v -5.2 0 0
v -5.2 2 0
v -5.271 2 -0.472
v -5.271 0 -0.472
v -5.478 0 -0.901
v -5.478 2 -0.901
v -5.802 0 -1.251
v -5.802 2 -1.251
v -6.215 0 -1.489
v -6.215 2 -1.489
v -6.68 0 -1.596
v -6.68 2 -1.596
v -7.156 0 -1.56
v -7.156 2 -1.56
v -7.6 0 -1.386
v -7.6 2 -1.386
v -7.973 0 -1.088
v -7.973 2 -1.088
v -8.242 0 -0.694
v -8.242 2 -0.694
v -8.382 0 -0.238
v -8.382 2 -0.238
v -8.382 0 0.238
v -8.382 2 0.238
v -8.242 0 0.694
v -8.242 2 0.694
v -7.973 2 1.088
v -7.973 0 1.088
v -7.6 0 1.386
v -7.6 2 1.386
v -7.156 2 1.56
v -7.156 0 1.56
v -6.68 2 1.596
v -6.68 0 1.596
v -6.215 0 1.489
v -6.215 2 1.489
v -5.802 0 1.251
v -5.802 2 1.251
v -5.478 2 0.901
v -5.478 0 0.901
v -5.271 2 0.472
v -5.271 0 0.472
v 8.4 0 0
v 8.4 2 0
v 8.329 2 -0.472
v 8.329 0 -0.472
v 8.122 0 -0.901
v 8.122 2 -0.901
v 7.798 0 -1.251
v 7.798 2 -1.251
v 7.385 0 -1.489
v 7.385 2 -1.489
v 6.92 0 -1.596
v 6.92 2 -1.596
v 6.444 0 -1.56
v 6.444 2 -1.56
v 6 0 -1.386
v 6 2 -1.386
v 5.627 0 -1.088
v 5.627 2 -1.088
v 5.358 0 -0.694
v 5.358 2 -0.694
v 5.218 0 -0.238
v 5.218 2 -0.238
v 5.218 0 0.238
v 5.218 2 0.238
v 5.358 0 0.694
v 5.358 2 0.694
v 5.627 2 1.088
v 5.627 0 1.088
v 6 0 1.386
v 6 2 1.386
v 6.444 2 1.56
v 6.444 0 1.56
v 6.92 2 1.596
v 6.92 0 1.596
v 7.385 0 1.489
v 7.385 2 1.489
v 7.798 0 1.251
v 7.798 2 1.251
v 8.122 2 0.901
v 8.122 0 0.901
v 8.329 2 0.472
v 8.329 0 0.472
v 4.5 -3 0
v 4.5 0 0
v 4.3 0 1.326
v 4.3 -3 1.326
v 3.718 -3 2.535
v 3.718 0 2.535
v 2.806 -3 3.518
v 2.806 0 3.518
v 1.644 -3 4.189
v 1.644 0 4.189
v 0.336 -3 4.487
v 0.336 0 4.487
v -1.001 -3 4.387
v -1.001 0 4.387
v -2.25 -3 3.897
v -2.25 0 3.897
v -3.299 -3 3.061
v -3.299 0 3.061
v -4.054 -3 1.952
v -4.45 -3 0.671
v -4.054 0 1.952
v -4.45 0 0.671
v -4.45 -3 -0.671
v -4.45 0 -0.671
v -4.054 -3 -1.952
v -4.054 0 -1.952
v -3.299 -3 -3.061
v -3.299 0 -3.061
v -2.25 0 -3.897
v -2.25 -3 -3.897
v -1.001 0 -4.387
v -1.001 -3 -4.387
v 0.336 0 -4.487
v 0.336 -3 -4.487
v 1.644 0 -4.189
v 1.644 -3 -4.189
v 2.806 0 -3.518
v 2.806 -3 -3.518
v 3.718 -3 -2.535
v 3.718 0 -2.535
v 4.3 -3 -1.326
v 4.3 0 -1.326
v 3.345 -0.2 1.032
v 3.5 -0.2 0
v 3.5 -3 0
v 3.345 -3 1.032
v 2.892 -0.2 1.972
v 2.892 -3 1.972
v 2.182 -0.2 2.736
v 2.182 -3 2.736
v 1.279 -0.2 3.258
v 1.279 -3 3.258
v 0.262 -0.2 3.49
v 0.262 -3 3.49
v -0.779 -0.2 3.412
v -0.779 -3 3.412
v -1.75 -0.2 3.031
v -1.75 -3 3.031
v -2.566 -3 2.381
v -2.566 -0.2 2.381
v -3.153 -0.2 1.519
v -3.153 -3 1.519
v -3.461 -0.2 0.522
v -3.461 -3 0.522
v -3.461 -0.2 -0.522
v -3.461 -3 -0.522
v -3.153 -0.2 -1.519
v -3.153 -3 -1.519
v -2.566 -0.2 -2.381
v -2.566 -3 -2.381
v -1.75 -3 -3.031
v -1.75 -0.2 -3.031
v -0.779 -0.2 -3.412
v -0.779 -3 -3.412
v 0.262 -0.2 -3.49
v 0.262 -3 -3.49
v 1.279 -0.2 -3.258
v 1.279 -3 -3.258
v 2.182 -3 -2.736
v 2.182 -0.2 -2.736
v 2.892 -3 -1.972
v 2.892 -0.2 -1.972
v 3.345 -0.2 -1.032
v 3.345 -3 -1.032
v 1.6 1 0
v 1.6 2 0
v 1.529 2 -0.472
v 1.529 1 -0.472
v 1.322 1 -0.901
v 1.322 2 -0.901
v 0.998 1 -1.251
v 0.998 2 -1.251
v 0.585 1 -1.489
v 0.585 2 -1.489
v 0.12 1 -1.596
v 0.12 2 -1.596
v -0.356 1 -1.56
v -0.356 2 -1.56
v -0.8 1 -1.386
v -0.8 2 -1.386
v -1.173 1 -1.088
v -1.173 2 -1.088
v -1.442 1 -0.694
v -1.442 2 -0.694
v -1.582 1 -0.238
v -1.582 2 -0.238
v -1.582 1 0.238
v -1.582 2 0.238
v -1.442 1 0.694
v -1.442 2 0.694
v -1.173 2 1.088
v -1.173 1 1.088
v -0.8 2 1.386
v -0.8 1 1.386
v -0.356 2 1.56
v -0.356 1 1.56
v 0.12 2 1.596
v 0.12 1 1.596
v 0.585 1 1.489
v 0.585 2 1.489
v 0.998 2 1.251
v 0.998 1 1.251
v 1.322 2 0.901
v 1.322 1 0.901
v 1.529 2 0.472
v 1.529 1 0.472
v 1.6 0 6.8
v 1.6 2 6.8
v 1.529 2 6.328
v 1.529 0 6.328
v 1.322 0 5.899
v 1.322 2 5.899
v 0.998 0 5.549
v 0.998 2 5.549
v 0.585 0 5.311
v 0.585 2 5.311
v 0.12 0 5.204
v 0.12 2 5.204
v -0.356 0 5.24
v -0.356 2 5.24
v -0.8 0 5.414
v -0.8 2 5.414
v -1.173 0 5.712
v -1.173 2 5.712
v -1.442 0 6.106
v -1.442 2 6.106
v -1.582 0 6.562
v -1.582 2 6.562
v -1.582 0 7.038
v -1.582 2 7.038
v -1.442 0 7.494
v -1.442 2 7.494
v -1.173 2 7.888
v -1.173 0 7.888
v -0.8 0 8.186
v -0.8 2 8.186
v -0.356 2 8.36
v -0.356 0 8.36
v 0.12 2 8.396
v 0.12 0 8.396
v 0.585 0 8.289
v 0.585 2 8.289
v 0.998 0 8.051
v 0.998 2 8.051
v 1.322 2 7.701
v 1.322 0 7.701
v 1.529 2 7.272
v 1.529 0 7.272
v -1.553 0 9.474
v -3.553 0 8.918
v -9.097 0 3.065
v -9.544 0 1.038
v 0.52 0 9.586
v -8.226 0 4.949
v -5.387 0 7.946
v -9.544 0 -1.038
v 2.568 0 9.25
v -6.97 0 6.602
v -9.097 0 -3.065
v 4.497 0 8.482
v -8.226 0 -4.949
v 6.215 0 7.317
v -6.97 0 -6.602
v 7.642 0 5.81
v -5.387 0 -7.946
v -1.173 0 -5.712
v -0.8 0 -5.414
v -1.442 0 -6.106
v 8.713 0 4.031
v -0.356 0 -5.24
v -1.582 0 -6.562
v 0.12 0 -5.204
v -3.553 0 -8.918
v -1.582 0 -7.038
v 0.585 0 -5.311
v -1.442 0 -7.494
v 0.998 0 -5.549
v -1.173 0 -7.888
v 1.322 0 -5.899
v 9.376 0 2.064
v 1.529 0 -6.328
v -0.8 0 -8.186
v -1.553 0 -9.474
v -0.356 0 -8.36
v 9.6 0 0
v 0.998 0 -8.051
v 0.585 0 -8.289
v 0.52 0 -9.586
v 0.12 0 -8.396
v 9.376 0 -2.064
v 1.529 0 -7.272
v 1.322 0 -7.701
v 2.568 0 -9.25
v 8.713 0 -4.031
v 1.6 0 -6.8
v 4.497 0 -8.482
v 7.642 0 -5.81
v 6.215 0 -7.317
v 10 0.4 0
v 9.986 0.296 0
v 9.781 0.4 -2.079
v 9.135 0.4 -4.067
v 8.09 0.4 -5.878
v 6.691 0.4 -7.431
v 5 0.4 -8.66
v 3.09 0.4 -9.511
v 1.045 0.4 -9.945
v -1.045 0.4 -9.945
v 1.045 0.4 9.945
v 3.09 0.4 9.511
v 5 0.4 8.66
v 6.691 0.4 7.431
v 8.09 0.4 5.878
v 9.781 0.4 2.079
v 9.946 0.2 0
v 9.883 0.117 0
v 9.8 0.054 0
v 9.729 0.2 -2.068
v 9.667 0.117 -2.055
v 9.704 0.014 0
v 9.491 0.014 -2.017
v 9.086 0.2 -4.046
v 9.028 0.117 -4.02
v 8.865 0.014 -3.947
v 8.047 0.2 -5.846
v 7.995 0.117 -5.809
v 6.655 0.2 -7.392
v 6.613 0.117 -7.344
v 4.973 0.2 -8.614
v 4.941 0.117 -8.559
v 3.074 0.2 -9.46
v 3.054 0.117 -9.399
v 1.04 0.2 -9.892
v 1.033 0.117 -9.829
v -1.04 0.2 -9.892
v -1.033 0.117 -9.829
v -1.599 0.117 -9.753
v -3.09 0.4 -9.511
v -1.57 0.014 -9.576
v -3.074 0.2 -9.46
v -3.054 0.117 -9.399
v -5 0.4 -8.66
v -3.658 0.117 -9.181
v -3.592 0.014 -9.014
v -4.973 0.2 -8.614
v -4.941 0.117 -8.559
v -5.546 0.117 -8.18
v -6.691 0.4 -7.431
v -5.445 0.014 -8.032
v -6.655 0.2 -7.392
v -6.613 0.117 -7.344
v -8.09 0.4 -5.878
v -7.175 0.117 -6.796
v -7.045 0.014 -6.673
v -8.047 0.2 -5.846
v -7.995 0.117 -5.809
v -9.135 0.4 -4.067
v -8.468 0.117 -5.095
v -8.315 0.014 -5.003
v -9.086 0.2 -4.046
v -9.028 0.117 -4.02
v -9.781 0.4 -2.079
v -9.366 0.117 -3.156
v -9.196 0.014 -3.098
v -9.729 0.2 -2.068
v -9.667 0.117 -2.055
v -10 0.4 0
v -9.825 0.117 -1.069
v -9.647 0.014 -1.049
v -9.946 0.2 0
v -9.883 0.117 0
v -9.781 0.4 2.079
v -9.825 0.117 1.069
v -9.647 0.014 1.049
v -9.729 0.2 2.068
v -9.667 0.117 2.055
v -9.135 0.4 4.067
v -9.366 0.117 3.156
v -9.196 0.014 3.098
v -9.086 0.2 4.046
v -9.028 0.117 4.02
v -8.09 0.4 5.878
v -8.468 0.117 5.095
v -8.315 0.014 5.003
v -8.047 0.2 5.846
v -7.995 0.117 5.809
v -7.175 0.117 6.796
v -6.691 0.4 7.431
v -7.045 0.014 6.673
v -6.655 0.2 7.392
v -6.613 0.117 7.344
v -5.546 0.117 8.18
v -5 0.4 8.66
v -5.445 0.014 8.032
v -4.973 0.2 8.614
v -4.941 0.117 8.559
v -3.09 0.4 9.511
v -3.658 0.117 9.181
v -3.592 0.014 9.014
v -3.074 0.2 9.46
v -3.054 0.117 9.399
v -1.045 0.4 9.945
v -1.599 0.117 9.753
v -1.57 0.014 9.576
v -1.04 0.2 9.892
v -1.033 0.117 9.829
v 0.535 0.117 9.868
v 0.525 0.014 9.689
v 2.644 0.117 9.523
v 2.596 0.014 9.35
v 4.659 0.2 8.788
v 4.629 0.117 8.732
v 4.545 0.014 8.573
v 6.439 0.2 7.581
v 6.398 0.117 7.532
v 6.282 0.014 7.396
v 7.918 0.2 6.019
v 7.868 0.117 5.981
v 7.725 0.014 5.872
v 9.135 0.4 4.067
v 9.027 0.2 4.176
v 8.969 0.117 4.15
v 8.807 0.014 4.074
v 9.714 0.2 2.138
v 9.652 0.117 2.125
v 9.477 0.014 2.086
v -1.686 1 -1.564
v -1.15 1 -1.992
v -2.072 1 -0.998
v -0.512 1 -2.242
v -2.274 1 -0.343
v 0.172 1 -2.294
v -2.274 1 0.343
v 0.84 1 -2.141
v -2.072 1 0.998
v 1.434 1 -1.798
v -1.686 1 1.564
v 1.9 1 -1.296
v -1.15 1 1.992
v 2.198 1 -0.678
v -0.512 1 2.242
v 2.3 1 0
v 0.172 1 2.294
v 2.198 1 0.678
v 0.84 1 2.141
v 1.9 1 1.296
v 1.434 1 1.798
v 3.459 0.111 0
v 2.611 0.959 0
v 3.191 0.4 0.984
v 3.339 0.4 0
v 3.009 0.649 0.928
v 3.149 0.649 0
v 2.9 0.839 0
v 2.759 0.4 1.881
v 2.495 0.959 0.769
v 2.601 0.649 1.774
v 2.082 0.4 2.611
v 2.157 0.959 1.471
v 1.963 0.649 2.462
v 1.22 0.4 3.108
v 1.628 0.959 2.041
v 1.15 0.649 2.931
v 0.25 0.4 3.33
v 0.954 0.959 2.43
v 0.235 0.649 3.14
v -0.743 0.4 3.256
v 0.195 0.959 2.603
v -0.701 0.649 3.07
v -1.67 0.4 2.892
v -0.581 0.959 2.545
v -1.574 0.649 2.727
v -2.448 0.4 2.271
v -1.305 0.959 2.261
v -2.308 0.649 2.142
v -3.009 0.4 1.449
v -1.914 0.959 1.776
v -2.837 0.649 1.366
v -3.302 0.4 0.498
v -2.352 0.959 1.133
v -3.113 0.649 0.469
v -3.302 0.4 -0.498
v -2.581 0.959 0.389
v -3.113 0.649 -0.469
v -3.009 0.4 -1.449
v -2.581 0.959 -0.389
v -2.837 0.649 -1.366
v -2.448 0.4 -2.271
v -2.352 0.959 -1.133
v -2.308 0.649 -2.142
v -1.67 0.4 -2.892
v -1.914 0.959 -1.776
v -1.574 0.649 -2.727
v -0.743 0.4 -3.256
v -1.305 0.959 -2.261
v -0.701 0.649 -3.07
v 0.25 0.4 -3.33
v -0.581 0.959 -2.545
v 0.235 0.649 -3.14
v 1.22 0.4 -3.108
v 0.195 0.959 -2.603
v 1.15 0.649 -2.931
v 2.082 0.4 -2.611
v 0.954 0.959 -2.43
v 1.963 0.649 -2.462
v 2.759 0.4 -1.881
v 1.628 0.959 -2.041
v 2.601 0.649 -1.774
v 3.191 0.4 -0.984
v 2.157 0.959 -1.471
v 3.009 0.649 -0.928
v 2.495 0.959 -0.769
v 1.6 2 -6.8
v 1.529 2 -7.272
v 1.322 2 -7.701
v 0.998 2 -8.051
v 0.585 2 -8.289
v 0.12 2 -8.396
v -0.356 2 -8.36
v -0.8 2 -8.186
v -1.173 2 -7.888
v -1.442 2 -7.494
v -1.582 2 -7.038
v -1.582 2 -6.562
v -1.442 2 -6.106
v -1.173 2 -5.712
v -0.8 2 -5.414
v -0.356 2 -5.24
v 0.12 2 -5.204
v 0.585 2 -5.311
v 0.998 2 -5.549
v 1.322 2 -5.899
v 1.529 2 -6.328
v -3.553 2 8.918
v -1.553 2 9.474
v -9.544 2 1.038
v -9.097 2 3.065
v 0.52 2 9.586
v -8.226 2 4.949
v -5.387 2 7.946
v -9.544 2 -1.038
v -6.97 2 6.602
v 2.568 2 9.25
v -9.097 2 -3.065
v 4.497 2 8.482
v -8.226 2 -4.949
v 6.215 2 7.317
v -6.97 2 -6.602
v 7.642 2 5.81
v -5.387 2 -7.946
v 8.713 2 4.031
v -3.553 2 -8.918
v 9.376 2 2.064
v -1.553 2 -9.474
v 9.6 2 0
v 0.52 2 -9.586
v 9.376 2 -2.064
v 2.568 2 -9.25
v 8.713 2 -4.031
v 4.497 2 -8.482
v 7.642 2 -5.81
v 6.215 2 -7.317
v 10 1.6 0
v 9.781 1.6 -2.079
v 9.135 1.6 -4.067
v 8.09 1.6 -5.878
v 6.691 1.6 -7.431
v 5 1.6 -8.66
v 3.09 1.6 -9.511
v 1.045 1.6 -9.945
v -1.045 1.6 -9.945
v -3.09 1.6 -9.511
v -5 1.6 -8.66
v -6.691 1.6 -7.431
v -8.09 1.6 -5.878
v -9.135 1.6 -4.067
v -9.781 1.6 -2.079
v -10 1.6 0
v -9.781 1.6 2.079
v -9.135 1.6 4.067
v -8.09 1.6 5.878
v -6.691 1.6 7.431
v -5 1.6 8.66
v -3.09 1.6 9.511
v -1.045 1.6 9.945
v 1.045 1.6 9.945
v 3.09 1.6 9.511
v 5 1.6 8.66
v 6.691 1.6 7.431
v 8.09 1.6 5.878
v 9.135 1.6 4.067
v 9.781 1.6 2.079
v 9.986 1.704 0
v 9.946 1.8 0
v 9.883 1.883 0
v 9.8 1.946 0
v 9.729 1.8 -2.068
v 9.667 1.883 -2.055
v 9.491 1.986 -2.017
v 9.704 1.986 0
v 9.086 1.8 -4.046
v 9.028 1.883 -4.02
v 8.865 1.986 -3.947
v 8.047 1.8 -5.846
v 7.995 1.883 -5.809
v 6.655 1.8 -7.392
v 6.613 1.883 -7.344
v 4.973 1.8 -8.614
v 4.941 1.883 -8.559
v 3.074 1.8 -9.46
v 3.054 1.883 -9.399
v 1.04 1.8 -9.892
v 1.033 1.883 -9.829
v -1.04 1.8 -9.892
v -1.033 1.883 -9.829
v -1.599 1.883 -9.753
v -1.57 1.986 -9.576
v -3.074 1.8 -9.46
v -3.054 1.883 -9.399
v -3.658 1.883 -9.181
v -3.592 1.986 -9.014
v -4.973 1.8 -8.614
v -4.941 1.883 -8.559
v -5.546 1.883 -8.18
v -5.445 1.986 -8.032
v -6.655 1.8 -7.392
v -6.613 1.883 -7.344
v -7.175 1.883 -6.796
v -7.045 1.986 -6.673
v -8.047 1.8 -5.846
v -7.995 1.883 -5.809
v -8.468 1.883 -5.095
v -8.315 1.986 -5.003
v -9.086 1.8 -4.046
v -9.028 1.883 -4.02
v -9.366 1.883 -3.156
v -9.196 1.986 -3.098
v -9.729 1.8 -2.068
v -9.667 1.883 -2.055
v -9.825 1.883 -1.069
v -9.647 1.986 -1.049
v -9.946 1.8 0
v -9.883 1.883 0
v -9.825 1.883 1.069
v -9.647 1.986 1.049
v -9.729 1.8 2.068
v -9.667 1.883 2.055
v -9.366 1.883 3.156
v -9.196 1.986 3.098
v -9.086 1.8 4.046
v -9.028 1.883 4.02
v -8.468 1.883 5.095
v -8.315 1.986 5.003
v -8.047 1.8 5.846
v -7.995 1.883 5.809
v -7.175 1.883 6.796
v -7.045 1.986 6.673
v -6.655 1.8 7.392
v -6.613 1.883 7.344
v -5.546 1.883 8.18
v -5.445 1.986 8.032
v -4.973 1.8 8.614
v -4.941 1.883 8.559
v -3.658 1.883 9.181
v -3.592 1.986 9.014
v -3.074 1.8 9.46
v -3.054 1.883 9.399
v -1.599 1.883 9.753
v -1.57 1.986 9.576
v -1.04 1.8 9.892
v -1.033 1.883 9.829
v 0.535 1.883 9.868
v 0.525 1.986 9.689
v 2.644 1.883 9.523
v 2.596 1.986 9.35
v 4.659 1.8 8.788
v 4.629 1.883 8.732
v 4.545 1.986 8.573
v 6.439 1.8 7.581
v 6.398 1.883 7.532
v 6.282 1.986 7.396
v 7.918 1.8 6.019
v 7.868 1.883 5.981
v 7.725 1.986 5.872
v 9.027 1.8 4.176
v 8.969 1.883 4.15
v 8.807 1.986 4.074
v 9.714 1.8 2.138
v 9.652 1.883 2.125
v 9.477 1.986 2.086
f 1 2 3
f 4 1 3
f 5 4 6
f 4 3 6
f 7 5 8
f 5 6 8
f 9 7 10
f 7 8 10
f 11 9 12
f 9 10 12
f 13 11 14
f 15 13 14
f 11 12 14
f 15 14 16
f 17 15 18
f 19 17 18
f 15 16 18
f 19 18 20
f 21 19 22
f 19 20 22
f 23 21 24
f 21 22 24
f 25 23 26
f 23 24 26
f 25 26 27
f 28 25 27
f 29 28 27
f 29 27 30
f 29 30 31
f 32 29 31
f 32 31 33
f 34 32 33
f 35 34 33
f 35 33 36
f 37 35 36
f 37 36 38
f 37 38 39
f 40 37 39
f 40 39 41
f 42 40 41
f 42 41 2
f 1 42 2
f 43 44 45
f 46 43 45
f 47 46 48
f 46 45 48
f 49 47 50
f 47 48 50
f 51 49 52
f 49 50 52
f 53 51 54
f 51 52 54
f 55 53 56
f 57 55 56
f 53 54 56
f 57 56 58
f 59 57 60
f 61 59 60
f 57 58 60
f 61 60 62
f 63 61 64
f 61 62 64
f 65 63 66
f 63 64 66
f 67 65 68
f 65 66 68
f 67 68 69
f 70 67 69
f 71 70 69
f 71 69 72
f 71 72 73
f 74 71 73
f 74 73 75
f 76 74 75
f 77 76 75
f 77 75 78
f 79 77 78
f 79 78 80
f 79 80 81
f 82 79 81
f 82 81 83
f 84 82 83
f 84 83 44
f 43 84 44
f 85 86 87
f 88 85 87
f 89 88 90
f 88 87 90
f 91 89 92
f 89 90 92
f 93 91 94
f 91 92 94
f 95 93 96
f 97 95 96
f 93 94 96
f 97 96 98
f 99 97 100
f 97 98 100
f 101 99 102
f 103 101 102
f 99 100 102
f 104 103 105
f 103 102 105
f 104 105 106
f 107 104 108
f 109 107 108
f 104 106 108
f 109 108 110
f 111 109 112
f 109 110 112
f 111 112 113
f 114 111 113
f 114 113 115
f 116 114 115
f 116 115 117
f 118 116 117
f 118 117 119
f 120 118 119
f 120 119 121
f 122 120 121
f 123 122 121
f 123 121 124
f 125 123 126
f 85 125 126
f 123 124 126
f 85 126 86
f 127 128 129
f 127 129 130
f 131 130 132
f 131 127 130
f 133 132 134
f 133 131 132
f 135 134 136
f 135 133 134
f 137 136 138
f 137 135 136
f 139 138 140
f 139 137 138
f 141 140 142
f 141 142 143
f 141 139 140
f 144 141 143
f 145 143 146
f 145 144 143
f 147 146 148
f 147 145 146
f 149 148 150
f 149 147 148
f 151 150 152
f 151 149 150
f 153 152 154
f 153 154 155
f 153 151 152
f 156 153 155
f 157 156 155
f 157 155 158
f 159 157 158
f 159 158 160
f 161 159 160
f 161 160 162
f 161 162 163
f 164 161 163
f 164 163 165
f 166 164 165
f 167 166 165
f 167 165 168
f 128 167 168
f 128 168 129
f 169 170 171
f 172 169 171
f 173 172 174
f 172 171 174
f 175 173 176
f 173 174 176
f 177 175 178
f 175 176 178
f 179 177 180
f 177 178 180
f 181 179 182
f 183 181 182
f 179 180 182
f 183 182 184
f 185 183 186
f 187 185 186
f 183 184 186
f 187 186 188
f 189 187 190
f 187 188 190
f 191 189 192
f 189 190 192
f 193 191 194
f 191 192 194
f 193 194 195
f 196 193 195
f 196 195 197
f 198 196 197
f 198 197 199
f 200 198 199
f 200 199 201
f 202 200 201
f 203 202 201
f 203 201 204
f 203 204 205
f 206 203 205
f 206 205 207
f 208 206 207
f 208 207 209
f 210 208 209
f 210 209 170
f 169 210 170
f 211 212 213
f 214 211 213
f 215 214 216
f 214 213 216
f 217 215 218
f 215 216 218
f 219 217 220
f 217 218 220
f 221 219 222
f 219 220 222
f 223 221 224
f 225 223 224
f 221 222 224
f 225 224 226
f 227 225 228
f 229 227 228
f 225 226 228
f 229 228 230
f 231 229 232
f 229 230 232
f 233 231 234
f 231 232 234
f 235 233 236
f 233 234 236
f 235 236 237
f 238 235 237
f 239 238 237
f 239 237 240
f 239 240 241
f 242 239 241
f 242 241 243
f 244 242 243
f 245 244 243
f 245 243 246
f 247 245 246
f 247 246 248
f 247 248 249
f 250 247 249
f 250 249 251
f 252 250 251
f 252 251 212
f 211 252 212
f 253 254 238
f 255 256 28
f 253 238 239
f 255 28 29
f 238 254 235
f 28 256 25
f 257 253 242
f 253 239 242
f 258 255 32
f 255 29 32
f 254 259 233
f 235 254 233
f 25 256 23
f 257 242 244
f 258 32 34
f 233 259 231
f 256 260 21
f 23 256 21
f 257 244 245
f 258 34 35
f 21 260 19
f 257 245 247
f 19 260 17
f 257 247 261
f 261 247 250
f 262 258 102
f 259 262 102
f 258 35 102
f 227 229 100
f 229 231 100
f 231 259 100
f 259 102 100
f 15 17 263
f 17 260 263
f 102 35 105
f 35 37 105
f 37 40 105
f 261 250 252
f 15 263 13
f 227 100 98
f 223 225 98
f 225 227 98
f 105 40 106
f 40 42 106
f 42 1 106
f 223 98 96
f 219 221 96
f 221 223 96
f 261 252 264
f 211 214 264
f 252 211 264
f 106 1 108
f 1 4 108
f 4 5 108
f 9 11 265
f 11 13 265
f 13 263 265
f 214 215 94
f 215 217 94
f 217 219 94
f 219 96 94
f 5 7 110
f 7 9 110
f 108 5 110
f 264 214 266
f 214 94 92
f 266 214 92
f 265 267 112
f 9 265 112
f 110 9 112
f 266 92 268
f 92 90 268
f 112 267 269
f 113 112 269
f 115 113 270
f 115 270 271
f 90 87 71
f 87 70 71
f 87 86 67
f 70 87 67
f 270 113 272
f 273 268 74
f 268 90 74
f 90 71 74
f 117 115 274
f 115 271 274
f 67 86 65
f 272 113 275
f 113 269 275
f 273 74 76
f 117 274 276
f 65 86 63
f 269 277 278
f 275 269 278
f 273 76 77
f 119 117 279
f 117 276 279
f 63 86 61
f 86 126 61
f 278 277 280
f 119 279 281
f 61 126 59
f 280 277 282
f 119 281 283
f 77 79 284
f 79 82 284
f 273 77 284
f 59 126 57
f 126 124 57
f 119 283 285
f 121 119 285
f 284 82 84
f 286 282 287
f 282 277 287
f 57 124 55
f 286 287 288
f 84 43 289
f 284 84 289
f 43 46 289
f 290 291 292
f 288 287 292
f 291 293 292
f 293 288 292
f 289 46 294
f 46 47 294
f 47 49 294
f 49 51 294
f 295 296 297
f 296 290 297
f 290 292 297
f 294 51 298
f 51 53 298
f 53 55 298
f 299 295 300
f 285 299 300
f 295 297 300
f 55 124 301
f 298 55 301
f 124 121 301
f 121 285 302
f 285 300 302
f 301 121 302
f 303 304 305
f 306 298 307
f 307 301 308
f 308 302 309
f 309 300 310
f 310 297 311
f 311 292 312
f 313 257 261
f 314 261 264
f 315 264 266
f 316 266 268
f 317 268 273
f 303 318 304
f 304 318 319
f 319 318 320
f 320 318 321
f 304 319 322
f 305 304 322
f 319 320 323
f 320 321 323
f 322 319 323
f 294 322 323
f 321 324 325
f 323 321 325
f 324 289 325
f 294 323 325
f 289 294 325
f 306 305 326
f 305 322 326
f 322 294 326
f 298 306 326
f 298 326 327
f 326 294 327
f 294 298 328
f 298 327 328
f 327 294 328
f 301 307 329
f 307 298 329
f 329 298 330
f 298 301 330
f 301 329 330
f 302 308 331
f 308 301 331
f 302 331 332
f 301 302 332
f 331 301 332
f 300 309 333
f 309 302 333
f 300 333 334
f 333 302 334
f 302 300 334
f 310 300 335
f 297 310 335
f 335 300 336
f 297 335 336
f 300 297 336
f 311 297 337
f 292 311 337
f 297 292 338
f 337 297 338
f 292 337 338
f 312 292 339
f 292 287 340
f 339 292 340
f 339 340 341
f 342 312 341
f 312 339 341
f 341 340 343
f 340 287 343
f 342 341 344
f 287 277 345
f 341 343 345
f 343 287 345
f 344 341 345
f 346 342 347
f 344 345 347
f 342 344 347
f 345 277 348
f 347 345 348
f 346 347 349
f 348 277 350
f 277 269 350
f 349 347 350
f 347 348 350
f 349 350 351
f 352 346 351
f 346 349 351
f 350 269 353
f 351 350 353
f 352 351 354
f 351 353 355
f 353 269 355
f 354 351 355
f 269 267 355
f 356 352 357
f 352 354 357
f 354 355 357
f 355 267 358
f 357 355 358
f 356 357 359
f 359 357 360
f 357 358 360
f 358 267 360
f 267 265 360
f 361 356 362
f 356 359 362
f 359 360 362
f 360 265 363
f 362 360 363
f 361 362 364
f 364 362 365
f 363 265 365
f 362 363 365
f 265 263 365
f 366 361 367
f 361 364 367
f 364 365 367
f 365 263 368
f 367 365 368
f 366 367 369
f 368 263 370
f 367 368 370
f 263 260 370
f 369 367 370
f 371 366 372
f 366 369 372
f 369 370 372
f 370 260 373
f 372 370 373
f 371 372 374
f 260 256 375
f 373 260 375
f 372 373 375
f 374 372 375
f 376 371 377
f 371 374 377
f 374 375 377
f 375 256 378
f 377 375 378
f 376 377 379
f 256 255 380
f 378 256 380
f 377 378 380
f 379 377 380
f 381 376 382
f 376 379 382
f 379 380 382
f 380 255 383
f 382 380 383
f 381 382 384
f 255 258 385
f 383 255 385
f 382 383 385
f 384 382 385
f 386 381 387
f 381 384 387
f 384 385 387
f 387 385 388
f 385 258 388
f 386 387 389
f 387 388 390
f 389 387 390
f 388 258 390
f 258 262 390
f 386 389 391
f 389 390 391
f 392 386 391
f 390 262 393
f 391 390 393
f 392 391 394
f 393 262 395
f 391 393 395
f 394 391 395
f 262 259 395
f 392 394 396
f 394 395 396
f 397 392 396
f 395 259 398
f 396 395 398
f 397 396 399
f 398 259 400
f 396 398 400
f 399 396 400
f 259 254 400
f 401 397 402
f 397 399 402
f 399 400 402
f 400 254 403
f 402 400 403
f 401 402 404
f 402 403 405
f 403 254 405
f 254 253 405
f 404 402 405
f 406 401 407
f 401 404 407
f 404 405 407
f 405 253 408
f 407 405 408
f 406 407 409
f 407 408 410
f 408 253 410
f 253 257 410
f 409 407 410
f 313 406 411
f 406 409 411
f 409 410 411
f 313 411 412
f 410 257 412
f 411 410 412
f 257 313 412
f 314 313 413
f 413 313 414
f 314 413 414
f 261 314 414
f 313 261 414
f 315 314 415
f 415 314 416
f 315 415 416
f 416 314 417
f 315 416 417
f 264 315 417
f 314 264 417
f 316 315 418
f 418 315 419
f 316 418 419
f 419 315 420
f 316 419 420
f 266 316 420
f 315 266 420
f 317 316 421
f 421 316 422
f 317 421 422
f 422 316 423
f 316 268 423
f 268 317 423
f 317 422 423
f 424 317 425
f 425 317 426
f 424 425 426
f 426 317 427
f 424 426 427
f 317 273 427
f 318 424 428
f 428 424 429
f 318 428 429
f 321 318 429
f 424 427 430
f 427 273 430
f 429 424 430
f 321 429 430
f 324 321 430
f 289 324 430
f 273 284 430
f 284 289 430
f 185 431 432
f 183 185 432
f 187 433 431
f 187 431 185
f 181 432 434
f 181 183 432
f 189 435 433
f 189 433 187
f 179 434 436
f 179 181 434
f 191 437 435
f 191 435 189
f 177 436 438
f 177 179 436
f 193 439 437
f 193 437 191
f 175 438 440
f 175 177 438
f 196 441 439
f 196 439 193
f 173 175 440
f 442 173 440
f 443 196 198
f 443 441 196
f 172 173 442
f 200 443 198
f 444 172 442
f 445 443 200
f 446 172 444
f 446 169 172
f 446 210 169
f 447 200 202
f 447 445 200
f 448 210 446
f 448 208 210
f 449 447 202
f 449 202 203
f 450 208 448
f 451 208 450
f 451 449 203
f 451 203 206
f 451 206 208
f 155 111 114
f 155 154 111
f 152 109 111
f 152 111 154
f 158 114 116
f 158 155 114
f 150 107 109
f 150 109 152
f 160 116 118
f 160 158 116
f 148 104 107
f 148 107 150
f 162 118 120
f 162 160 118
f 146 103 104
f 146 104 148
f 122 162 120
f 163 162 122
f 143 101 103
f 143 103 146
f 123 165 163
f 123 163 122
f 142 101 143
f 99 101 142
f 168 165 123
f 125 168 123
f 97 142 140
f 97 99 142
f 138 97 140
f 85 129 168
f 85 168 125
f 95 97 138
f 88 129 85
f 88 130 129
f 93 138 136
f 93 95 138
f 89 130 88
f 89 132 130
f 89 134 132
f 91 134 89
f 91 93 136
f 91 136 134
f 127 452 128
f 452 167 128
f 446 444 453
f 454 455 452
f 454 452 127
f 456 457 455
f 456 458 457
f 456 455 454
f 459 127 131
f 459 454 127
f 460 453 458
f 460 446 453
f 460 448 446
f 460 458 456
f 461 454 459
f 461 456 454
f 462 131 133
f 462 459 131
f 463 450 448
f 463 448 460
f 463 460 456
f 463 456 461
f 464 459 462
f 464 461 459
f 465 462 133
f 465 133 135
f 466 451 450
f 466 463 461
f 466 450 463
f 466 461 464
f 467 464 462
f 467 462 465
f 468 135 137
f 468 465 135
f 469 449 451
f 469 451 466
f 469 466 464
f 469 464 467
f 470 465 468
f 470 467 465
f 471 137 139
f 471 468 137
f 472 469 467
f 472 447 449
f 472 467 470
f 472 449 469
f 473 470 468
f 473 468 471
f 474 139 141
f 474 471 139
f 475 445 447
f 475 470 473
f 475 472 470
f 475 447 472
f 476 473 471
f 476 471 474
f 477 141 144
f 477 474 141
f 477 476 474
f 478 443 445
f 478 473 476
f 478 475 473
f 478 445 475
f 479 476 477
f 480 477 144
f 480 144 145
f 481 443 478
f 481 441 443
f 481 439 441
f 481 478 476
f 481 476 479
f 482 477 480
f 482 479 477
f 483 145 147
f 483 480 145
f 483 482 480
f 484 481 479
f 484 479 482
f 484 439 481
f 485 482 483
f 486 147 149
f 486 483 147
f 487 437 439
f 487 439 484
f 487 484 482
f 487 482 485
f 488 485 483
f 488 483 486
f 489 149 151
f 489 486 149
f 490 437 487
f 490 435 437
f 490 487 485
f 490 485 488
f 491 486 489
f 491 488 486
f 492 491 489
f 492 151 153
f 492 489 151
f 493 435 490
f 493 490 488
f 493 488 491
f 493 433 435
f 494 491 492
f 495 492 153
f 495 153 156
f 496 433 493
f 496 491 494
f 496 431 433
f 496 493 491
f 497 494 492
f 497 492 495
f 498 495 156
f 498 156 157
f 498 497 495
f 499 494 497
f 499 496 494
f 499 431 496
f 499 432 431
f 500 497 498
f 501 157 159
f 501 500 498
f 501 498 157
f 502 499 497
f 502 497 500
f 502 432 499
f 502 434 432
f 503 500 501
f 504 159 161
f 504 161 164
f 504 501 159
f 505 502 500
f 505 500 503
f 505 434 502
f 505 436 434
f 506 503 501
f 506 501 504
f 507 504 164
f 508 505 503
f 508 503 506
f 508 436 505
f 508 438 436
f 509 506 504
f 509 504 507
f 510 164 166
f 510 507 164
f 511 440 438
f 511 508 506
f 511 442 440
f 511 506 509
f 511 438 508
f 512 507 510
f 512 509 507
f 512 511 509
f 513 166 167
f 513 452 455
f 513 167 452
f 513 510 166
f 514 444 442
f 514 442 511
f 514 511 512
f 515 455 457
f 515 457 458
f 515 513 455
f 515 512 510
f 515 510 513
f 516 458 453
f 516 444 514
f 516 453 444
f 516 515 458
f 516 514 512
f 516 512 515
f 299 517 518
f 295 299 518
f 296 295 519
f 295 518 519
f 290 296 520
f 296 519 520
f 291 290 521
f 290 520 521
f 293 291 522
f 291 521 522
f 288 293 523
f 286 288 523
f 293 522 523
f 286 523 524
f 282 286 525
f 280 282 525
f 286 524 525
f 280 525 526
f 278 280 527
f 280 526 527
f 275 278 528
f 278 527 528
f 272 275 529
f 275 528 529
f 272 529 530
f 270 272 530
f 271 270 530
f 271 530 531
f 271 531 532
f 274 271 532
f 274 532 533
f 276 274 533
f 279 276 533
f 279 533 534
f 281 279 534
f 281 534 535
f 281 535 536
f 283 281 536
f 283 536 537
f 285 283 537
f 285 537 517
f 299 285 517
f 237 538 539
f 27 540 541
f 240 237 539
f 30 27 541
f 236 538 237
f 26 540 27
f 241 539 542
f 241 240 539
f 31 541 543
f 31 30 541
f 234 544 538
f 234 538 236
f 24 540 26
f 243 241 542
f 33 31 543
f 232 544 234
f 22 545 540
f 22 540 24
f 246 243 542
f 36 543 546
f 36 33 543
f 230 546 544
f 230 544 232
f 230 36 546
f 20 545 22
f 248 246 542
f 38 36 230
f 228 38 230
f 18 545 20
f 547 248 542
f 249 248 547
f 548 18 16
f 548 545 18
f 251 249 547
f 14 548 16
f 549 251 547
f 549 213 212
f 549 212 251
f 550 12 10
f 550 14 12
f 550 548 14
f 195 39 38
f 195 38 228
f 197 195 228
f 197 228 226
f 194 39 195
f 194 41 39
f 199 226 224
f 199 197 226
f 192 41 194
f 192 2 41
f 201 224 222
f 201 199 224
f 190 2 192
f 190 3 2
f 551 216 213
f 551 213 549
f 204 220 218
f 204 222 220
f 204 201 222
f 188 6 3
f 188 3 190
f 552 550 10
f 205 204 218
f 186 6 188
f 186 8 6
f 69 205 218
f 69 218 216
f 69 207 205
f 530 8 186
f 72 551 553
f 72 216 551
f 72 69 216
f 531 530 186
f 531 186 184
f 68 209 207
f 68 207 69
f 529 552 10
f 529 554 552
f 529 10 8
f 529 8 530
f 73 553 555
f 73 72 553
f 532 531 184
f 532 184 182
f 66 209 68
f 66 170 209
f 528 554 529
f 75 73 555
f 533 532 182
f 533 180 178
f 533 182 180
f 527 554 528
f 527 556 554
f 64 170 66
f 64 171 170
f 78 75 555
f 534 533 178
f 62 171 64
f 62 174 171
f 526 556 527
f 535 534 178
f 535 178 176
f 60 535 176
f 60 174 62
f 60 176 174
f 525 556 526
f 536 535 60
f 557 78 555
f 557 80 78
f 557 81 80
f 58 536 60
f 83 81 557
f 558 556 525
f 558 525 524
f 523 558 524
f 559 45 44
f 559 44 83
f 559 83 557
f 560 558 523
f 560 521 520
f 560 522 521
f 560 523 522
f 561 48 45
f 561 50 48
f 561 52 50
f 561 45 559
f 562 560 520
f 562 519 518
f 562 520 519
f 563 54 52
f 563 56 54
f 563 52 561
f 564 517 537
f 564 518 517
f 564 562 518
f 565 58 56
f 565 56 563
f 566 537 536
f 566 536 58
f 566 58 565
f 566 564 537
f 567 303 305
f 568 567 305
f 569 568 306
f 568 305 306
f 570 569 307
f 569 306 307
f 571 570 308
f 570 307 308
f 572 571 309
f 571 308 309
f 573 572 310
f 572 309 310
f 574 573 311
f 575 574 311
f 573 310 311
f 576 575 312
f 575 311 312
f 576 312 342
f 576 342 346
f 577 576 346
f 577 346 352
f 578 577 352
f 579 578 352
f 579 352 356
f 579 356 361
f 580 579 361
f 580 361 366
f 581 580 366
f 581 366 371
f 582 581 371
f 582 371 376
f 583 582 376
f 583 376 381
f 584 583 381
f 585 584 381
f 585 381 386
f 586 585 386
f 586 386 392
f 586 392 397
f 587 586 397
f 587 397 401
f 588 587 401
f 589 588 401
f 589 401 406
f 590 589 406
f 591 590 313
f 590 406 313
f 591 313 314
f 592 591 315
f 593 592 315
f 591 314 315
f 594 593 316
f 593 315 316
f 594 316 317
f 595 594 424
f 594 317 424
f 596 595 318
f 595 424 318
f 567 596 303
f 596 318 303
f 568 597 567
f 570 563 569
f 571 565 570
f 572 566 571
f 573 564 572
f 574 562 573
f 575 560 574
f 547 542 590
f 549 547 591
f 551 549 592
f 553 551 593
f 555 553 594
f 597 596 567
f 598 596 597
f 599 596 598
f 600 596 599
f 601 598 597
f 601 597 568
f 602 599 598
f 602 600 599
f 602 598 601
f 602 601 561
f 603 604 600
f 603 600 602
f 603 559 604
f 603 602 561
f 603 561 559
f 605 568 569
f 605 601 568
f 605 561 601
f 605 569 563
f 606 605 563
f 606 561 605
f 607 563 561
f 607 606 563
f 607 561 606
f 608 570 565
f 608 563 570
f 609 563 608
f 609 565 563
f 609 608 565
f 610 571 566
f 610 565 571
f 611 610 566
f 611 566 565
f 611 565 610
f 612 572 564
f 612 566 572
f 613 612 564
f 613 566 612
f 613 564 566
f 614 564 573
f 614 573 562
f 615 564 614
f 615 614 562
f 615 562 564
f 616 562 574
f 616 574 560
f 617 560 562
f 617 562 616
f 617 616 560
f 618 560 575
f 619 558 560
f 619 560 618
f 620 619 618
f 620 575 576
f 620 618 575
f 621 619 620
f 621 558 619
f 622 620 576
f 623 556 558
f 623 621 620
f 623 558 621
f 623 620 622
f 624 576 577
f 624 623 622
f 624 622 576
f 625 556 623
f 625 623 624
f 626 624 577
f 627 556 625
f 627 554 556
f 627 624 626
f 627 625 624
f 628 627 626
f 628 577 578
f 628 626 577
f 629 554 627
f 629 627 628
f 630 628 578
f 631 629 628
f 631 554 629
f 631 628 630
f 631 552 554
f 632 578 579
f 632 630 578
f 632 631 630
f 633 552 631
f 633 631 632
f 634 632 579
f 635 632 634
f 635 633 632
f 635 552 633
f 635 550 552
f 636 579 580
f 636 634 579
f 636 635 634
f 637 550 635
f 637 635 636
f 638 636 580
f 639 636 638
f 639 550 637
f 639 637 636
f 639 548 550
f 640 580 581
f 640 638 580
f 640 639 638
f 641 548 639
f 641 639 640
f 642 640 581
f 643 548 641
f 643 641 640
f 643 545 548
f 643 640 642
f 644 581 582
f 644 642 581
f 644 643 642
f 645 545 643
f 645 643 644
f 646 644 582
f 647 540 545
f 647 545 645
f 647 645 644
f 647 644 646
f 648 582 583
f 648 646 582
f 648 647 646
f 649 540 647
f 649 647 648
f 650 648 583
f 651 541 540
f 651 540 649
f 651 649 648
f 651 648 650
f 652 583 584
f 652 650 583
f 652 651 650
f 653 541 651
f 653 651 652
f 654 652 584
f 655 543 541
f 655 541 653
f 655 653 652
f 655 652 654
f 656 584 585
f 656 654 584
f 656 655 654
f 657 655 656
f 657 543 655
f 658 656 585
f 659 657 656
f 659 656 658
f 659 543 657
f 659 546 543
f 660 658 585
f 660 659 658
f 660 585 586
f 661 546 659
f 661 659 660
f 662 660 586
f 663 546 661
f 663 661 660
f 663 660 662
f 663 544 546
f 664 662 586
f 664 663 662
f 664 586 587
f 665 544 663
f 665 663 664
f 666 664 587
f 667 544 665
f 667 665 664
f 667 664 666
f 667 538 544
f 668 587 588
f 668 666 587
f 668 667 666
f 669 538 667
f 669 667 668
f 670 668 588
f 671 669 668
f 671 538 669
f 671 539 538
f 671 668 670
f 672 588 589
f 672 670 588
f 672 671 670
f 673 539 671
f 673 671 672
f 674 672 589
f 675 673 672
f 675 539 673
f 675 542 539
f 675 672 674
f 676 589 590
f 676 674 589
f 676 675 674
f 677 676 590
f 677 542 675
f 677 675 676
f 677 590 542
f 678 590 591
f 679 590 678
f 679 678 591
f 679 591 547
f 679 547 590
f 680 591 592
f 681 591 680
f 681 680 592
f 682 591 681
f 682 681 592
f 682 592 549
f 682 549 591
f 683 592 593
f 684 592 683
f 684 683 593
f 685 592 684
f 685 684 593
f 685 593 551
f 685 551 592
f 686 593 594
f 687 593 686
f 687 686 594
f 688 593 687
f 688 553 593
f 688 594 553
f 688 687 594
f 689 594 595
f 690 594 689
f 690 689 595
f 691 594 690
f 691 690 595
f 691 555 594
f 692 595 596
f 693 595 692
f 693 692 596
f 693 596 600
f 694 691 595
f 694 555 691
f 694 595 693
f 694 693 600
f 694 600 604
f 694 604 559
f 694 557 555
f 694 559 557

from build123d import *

# Parameters (mm, degrees)
SKETCH1_R           = 10
BOSS_EXTRUDE1_DEPTH = 0.5
SKETCH2_R           = 10
BOSS_EXTRUDE2_DEPTH = 0.5
SKETCH3_R           = 10
BOSS_EXTRUDE3_DEPTH = 1
SKETCH5_R           = 1.6
CUT_EXTRUDE2_DEPTH  = 3
SKETCH8_R           = 1.6
CUT_EXTRUDE4_DEPTH  = 10
FILLET1_R           = 0.4
SKETCH9_R           = 4.5
SKETCH9_R_2         = 3.5
BOSS_EXTRUDE4_DEPTH = 3
SKETCH10_R          = 3.5
CUT_EXTRUDE5_DEPTH  = 1
FILLET3_R           = 1.2


with BuildPart() as part:
    # Sketch1 → Boss-Extrude1 (new body)
    with BuildSketch(Plane(origin=(0, 0, 0), x_dir=(1, 0, 0), z_dir=(0, 1, 0))):
        Circle(SKETCH1_R)
    extrude(amount=BOSS_EXTRUDE1_DEPTH)

    # Sketch2 → Boss-Extrude2 (add)
    with BuildSketch(Plane(origin=(0, 0.5, 0), x_dir=(1, 0, 0), z_dir=(0, 1, 0))):
        Circle(SKETCH2_R)
    extrude(amount=BOSS_EXTRUDE2_DEPTH)

    # Sketch3 → Boss-Extrude3 (add)
    with BuildSketch(Plane(origin=(0, 1, 0), x_dir=(1, 0, 0), z_dir=(0, 1, 0))):
        Circle(SKETCH3_R)
    extrude(amount=BOSS_EXTRUDE3_DEPTH)

    # Sketch5 → Cut-Extrude2 (cut, through all)
    with BuildSketch(Plane(origin=(0, 2, 0), x_dir=(1, 0, 0), z_dir=(0, 1, 0))):
        Circle(SKETCH5_R)
    extrude(amount=-CUT_EXTRUDE2_DEPTH, mode=Mode.SUBTRACT)

    # Sketch8 → Cut-Extrude4 (cut)
    with BuildSketch(Plane(origin=(0, 2, 0), x_dir=(1, 0, 0), z_dir=(0, 1, 0))):
        with Locations((-6.8, 0)):
            Circle(SKETCH8_R)
        with Locations((6.8, 0)):
            Circle(SKETCH8_R)
        with Locations((0, 6.8)):
            Circle(SKETCH8_R)
        with Locations((0, -6.8)):
            Circle(SKETCH8_R)
    extrude(amount=-CUT_EXTRUDE4_DEPTH, mode=Mode.SUBTRACT)

    # Fillet1
    fillet1_edges = [part.edges().sort_by_distance(p)[0] for p in [
        (-10, 0, 0),
        (-10, 2, 0),
    ]]
    fillet(fillet1_edges, radius=FILLET1_R)

    # Sketch9 → Boss-Extrude4 (add)
    with BuildSketch(Plane.XZ):
        Circle(SKETCH9_R)
        Circle(SKETCH9_R_2, mode=Mode.SUBTRACT)
    extrude(amount=BOSS_EXTRUDE4_DEPTH)

    # Sketch10 → Cut-Extrude5 (cut)
    with BuildSketch(Plane.XZ):
        Circle(SKETCH10_R)
    extrude(amount=-CUT_EXTRUDE5_DEPTH, mode=Mode.SUBTRACT)

    # Fillet3
    fillet3_edges = [part.edges().sort_by_distance(p)[0] for p in [
        (-3.5, 1, 0),
    ]]
    fillet(fillet3_edges, radius=FILLET3_R)


solid = part.part
